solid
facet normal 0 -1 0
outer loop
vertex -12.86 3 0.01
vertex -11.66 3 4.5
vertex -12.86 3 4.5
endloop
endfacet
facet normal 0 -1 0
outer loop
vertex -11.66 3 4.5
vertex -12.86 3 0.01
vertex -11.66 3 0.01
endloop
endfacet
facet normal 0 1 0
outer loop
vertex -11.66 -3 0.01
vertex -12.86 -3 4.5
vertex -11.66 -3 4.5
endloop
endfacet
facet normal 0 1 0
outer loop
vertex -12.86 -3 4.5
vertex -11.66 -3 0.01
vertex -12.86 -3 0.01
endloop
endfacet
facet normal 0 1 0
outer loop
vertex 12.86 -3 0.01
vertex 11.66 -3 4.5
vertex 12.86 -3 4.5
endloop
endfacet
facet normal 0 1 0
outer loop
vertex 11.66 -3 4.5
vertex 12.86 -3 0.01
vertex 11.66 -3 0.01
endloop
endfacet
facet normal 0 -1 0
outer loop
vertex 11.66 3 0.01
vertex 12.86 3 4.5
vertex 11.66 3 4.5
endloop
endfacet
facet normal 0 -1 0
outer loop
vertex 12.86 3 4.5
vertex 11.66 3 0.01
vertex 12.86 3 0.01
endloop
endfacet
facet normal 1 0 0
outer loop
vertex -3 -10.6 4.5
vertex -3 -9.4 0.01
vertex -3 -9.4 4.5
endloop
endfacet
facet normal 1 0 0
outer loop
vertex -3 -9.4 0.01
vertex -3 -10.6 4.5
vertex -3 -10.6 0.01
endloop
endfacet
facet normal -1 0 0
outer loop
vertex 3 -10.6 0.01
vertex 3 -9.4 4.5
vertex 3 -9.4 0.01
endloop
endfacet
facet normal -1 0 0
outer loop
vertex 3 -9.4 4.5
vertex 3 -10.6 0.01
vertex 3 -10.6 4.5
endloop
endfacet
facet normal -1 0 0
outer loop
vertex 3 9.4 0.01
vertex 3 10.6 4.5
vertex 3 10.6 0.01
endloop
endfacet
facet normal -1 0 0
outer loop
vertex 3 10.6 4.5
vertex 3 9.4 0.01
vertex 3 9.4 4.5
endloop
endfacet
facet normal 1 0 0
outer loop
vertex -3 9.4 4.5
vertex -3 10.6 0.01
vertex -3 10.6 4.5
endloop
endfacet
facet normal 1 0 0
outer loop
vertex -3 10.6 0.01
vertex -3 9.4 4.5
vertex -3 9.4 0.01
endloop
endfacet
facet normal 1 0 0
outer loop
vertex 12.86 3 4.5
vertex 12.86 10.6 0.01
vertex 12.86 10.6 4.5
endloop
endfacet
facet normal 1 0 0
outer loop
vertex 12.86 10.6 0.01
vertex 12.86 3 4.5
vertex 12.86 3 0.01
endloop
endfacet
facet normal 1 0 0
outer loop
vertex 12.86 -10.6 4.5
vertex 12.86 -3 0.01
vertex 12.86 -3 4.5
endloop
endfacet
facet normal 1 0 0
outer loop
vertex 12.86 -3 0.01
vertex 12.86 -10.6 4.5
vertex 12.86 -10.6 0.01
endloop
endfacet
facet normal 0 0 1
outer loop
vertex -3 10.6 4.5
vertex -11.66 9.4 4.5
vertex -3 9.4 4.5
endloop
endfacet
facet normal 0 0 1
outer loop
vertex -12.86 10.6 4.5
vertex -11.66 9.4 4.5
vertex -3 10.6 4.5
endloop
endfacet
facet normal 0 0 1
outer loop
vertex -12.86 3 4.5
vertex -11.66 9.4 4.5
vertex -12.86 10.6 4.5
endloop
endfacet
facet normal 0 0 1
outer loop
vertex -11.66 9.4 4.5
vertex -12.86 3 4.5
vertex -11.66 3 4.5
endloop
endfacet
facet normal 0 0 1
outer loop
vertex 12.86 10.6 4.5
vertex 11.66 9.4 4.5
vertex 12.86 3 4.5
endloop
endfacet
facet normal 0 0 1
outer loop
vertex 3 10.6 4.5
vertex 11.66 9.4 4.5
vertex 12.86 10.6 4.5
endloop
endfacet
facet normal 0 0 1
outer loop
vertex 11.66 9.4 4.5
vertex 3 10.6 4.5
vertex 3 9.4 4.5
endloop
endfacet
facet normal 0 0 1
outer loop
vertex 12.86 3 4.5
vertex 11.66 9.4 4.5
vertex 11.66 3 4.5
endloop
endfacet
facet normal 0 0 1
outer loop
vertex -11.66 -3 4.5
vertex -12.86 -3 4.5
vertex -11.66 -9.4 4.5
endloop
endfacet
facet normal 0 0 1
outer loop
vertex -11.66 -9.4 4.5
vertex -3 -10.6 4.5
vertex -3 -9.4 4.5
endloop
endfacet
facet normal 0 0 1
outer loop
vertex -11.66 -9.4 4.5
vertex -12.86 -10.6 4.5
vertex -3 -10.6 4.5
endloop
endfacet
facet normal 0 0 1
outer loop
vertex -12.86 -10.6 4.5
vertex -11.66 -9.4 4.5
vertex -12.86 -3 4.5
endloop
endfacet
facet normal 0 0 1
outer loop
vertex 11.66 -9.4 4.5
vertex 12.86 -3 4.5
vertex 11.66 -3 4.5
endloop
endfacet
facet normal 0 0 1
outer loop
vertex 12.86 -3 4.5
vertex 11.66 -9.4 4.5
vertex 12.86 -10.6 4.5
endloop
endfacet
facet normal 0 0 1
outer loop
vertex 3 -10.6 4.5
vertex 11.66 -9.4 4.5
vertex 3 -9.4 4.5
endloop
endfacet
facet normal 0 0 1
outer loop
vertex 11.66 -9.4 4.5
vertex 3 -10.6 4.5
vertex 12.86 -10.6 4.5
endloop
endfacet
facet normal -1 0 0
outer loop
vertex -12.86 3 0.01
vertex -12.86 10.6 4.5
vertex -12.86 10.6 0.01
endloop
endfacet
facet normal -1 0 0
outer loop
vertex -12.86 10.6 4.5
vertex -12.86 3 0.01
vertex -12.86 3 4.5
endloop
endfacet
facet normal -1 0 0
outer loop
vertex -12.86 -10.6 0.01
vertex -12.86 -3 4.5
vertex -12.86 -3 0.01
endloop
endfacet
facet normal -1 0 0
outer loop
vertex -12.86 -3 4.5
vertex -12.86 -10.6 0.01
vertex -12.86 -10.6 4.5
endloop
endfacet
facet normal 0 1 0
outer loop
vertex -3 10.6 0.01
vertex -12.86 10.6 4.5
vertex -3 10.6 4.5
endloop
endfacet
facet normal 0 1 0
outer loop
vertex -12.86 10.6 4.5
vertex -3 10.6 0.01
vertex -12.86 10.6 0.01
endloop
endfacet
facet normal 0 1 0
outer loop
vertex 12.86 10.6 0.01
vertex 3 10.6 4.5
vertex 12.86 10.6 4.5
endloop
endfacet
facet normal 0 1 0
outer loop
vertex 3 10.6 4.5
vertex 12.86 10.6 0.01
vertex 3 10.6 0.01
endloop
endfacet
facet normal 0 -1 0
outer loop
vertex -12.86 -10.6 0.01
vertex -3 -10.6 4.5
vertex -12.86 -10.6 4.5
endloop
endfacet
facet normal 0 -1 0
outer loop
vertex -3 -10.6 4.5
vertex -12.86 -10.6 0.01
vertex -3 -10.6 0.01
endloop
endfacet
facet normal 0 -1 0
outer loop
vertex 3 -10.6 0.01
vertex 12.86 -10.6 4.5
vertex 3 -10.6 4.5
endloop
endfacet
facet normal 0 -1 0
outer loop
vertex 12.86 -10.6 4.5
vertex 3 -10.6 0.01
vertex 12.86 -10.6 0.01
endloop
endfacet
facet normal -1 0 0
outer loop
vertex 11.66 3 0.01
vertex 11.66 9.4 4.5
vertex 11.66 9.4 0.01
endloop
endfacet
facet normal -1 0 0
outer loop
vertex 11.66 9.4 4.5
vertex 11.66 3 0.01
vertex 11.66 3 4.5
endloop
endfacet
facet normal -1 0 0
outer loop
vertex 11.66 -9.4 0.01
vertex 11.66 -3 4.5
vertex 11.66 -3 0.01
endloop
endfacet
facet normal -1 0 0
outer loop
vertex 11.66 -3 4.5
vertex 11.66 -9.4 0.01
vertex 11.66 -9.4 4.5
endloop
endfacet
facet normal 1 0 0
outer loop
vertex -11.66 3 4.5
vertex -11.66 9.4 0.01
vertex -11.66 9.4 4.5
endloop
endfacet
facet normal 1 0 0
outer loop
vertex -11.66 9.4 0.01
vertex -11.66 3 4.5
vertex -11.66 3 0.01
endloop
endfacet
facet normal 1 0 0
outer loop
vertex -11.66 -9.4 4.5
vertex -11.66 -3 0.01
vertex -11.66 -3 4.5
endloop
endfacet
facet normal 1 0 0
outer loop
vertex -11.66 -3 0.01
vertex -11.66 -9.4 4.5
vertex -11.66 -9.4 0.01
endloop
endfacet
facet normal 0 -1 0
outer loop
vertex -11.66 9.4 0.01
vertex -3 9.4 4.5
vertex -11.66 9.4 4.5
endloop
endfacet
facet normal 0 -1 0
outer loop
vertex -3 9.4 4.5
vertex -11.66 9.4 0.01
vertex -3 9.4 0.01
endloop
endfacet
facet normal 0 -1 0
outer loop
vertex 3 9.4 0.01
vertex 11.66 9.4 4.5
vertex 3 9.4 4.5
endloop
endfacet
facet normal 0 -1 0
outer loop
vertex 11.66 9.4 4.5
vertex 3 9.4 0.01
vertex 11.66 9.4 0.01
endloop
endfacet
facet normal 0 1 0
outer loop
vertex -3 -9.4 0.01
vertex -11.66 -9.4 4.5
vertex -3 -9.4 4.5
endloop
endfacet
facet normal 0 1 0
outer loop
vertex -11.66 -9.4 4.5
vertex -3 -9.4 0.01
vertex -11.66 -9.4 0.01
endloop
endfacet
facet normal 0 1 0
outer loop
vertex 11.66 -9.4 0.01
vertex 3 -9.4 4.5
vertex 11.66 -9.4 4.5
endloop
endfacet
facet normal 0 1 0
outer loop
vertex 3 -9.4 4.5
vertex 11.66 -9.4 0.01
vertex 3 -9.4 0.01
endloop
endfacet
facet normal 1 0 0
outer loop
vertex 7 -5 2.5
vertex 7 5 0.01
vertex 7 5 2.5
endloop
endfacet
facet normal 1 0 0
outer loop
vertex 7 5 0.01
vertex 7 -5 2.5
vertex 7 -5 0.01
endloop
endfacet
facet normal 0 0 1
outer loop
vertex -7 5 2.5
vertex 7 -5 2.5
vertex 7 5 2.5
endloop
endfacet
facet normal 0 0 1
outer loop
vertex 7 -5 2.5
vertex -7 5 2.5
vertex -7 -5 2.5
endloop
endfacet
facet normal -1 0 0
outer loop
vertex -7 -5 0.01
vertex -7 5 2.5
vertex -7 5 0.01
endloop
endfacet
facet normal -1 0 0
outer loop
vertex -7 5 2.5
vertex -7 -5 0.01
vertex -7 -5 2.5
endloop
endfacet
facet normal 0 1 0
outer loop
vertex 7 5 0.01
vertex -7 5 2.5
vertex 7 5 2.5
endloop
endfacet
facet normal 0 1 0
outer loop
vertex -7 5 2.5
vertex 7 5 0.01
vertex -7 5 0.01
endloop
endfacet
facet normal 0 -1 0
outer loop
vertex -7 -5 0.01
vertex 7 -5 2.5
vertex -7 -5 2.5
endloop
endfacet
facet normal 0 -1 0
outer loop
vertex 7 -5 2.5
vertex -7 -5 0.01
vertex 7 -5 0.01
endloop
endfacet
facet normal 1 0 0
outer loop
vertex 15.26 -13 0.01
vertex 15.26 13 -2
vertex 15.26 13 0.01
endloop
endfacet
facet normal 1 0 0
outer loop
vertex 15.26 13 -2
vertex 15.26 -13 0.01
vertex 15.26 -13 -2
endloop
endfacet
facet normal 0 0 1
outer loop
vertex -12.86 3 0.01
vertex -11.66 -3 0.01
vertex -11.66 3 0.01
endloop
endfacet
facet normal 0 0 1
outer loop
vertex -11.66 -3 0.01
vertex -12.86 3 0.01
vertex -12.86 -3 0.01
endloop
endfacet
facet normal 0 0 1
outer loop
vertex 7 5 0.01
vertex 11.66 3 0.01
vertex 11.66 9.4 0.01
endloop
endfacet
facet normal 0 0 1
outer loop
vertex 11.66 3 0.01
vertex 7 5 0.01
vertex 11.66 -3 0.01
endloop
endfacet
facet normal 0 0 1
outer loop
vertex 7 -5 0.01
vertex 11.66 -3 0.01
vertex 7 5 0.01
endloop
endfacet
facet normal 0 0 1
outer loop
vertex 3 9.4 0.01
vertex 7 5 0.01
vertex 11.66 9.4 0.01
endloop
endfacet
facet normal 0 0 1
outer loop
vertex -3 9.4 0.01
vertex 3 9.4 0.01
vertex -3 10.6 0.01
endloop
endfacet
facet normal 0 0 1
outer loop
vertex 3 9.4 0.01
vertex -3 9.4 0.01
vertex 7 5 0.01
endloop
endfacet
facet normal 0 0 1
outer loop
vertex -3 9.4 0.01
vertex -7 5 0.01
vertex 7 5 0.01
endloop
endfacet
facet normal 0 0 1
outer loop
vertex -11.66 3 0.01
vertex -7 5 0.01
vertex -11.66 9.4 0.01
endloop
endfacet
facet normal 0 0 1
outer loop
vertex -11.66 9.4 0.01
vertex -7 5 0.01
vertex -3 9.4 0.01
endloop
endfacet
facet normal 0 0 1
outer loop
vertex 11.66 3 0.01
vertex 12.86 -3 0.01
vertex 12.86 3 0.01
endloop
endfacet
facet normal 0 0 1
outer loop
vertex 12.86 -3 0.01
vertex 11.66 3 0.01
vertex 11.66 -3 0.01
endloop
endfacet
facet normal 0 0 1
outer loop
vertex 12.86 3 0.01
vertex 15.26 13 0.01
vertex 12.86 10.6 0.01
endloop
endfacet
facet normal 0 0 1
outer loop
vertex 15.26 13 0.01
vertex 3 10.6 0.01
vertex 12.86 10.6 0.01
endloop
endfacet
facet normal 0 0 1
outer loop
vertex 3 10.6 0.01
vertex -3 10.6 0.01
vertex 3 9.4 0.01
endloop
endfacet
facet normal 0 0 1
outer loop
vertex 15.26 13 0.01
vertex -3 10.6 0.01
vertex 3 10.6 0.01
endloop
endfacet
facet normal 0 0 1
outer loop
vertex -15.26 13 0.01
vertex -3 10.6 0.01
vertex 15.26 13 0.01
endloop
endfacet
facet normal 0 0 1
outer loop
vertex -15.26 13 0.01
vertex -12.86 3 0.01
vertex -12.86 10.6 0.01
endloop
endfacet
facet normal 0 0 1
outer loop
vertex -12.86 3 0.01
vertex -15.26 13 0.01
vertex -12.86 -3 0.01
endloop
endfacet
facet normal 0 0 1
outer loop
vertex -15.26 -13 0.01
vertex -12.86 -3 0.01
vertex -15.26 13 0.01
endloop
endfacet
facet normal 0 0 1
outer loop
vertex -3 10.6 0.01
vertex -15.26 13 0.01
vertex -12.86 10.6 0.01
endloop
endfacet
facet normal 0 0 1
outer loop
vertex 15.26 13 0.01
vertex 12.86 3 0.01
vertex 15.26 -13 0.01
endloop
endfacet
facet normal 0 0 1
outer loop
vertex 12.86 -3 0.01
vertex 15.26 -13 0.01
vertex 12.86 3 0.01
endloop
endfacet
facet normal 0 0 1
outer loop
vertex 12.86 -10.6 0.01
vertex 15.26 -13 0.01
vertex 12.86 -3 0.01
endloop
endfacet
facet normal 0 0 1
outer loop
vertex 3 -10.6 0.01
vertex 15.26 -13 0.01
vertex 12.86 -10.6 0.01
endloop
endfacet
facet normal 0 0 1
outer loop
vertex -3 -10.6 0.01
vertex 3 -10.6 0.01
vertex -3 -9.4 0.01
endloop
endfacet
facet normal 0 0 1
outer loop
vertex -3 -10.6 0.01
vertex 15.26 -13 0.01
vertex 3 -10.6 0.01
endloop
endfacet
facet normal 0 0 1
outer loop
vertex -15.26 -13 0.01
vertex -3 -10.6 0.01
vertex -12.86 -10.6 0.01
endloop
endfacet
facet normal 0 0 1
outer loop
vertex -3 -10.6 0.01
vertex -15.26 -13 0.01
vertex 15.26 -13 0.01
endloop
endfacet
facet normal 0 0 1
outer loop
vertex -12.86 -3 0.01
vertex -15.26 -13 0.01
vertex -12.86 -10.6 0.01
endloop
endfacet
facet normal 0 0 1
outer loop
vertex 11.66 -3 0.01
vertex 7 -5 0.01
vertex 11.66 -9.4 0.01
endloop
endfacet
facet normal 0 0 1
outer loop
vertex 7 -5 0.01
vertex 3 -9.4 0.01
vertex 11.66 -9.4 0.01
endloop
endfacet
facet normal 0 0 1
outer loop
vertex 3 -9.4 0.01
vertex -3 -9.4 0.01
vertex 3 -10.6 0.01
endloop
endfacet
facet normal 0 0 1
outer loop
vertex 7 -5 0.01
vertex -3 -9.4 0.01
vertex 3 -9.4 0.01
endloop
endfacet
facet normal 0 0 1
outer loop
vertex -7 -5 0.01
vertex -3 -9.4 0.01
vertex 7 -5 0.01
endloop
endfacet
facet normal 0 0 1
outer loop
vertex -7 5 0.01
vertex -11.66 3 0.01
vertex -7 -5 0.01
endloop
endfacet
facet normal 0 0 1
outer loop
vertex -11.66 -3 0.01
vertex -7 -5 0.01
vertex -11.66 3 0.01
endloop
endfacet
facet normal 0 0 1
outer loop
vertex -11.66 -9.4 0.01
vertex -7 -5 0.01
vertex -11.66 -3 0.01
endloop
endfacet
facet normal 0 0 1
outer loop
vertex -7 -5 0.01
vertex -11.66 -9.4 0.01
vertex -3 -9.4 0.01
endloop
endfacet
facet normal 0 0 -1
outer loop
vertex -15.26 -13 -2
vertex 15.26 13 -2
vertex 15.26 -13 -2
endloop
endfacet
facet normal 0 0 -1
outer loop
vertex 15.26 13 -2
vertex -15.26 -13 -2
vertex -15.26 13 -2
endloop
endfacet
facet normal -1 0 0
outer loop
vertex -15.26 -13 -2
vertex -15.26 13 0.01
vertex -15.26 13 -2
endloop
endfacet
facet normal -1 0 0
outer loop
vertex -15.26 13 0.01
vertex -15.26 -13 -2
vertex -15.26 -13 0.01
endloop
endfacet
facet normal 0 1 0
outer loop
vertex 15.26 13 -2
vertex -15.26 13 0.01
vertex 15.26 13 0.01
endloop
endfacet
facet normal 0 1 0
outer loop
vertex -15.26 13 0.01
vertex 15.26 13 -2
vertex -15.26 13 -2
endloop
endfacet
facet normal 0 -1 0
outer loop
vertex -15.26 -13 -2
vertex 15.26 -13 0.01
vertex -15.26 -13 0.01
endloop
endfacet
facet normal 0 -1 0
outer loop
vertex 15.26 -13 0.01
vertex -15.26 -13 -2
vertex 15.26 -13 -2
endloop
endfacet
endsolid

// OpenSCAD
// file: ../board-pocket.scad
//-----------------------------------------------------------------------
// Board pocket: holds a board that has no mounting holes
//
// The board sits on a central pedestal with a pad of double-sided foam tape
// on top, inside a low wall that follows its outline. The pedestal keeps
// the board's edges off the floor, so lead stubs soldered through the edge
// holes have room underneath; gaps in the wall let the leads out. The wall
// only locates the board: the tape holds it down, and in a closed box a lid
// pad presses a pad of foam onto it (boardLidPad below).
//
// Modules, all in the same frame:
//   boardPocketGhost()   the board and its tape, for previews
//   boardPocketHolder()  the plastic: pedestal and outline wall, add to the floor
//   boardLidPad()        a block hanging from the lid that presses foam onto the board
//   boardLidPadGhost()   the foam under it, squashed, for previews
//
// Frame: origin on the floor top, under the centre of the board's outline.
// X along the board's length l, Y across its width w, Z up. Units: mm.
//
// Sides are listed [-X, +X, -Y, +Y], each one of
//   "gap"    wall with a gap in the middle for leads (gapW wide)
//   "solid"  whole wall: use it where the board takes a push (a plug)
//   "open"   no wall: the board's edge goes into a box wall (a USB port)
//
// Used by esp32-c3-supermini, esp32-s3-devkitc and rs485-max485.
//-----------------------------------------------------------------------

//-- From the controller project's receiver.scad / rack-end.scad (boardPocket), 2026-10-30
bpPedestal  = 2.5;     // floor to the tape: room for lead stubs under the board edges
bpTape      = 1.0;     // double-sided foam tape on the pedestal. CAL: how far it squashes
bpWall      = 1.2;     // outline wall thickness
bpRise      = 1.0;     // wall top above the PCB underside (the controller project's rack-end: 0.8 under the S3's module)
bpClearance = 0.4;     // per side, board outline to wall: PETG. 0.3 for PLA. Set by the fit piece
bpGapW      = 6;       // lead gap in a "gap" side
bpPadInset  = 4;       // default pedestal: the board less this all round

//-- Lid hold-down (the controller project's receiver / rack-end lid pads)
bpFoam      = 3.0;     // CAL: self-adhesive foam stuck under each lid pad
bpSqueeze   = 1.0;     // how far the lid squashes it: ~1/3 for soft foam, 0.3 for felt

//-- PCB underside above the floor top
function boardPocketZ(pedestal = bpPedestal, tape = bpTape) = pedestal + tape;
//-- default pedestal [l, w] for a board
function boardPocketPad(l, w, inset = bpPadInset) = [max(l - 2*inset, 4), max(w - 2*inset, 4)];
//-- Z of a lid pad's underside, pressing on a surface at surfaceZ (board top, or a part on it)
function boardLidPadZ(surfaceZ, foam = bpFoam, squeeze = bpSqueeze) =
  assert(squeeze > 0 && squeeze < foam, "foam would not touch the board")
  surfaceZ + foam - squeeze;

function bpSides4(s) = is_list(s) ? s : [s, s, s, s];

module boardPocketGhost(l, w, pcb = 1.6, pad, pedestal = bpPedestal, tape = bpTape)
{
  p = is_undef(pad) ? boardPocketPad(l, w) : pad;
  %color("White") translate([-p[0]/2, -p[1]/2, pedestal]) cube([p[0], p[1], tape]);
  %color("DarkGreen") translate([-l/2, -w/2, pedestal + tape]) cube([l, w, pcb]);
}

//-- pad: pedestal [l, w]; gapW a number or one per side
module boardPocketHolder(l, w, pad, sides = "gap", gapW = bpGapW, clearance = bpClearance,
                         pedestal = bpPedestal, tape = bpTape, wall = bpWall, rise = bpRise)
{
  p   = is_undef(pad) ? boardPocketPad(l, w) : pad;
  s   = bpSides4(sides);
  g   = bpSides4(gapW);
  ix  = l/2 + clearance;                 // inner half sizes
  iy  = w/2 + clearance;
  top = pedestal + tape + rise;
  assert(p[0] <= l && p[1] <= w, "pedestal bigger than the board");
  for (k = s) assert(k == "gap" || k == "solid" || k == "open", str("unknown side ", k));

  //-- pedestal, centred under the board
  translate([-p[0]/2, -p[1]/2, -0.01]) cube([p[0], p[1], pedestal + 0.01]);
  //-- outline wall
  difference()
  {
    translate([-ix - wall, -iy - wall, -0.01]) cube([2*(ix + wall), 2*(iy + wall), top + 0.01]);
    translate([-ix, -iy, -1]) cube([2*ix, 2*iy, top + 2]);
    for (i = [0 : 3])
    {
      //-- each side's cut, drawn for -X then turned into place
      ax = (i < 2) ? ix : iy;         // inner half size across the side
      al = (i < 2) ? iy : ix;         // half length along it
      rotate([0, 0, [0, 180, 90, 270][i]])   // -X, +X, -Y, +Y
      {
        if (s[i] == "gap")
          translate([-ax - wall - 1, -g[i]/2, -1]) cube([wall + 2, g[i], top + 2]);
        if (s[i] == "open")
          translate([-ax - wall - 1, -al - wall - 1, -1]) cube([wall + 1.01, 2*(al + wall + 1), top + 2]);
      }
    }
  }
}

//-- A lid pad over the rectangle size [x, y] centred at `at`, from the squashed foam up to
//-- lidZ (the lid's inner face in this frame), running `into` up into the lid plate
module boardLidPad(size, at = [0, 0], surfaceZ, lidZ, foam = bpFoam, squeeze = bpSqueeze, into = 0.5)
{
  z0 = boardLidPadZ(surfaceZ, foam, squeeze);
  assert(lidZ > z0, "lid is below the pad: the box is too low for the foam");
  translate([at[0] - size[0]/2, at[1] - size[1]/2, z0]) cube([size[0], size[1], lidZ - z0 + into]);
}

module boardLidPadGhost(size, at = [0, 0], surfaceZ, foam = bpFoam, squeeze = bpSqueeze)
{
  %color("Gray") translate([at[0] - size[0]/2, at[1] - size[1]/2, surfaceZ]) cube([size[0], size[1], foam - squeeze]);
}
// main file
// A pocket on a piece of floor, for the catalogue: the C3 Super Mini's.
use <../board-pocket.scad>

l = 22.52; w = 18; pad = [14, 10];
translate([-l/2 - 4, -w/2 - 4, -2]) cube([l + 8, w + 8, 2.01]);
boardPocketHolder(l, w, pad);
